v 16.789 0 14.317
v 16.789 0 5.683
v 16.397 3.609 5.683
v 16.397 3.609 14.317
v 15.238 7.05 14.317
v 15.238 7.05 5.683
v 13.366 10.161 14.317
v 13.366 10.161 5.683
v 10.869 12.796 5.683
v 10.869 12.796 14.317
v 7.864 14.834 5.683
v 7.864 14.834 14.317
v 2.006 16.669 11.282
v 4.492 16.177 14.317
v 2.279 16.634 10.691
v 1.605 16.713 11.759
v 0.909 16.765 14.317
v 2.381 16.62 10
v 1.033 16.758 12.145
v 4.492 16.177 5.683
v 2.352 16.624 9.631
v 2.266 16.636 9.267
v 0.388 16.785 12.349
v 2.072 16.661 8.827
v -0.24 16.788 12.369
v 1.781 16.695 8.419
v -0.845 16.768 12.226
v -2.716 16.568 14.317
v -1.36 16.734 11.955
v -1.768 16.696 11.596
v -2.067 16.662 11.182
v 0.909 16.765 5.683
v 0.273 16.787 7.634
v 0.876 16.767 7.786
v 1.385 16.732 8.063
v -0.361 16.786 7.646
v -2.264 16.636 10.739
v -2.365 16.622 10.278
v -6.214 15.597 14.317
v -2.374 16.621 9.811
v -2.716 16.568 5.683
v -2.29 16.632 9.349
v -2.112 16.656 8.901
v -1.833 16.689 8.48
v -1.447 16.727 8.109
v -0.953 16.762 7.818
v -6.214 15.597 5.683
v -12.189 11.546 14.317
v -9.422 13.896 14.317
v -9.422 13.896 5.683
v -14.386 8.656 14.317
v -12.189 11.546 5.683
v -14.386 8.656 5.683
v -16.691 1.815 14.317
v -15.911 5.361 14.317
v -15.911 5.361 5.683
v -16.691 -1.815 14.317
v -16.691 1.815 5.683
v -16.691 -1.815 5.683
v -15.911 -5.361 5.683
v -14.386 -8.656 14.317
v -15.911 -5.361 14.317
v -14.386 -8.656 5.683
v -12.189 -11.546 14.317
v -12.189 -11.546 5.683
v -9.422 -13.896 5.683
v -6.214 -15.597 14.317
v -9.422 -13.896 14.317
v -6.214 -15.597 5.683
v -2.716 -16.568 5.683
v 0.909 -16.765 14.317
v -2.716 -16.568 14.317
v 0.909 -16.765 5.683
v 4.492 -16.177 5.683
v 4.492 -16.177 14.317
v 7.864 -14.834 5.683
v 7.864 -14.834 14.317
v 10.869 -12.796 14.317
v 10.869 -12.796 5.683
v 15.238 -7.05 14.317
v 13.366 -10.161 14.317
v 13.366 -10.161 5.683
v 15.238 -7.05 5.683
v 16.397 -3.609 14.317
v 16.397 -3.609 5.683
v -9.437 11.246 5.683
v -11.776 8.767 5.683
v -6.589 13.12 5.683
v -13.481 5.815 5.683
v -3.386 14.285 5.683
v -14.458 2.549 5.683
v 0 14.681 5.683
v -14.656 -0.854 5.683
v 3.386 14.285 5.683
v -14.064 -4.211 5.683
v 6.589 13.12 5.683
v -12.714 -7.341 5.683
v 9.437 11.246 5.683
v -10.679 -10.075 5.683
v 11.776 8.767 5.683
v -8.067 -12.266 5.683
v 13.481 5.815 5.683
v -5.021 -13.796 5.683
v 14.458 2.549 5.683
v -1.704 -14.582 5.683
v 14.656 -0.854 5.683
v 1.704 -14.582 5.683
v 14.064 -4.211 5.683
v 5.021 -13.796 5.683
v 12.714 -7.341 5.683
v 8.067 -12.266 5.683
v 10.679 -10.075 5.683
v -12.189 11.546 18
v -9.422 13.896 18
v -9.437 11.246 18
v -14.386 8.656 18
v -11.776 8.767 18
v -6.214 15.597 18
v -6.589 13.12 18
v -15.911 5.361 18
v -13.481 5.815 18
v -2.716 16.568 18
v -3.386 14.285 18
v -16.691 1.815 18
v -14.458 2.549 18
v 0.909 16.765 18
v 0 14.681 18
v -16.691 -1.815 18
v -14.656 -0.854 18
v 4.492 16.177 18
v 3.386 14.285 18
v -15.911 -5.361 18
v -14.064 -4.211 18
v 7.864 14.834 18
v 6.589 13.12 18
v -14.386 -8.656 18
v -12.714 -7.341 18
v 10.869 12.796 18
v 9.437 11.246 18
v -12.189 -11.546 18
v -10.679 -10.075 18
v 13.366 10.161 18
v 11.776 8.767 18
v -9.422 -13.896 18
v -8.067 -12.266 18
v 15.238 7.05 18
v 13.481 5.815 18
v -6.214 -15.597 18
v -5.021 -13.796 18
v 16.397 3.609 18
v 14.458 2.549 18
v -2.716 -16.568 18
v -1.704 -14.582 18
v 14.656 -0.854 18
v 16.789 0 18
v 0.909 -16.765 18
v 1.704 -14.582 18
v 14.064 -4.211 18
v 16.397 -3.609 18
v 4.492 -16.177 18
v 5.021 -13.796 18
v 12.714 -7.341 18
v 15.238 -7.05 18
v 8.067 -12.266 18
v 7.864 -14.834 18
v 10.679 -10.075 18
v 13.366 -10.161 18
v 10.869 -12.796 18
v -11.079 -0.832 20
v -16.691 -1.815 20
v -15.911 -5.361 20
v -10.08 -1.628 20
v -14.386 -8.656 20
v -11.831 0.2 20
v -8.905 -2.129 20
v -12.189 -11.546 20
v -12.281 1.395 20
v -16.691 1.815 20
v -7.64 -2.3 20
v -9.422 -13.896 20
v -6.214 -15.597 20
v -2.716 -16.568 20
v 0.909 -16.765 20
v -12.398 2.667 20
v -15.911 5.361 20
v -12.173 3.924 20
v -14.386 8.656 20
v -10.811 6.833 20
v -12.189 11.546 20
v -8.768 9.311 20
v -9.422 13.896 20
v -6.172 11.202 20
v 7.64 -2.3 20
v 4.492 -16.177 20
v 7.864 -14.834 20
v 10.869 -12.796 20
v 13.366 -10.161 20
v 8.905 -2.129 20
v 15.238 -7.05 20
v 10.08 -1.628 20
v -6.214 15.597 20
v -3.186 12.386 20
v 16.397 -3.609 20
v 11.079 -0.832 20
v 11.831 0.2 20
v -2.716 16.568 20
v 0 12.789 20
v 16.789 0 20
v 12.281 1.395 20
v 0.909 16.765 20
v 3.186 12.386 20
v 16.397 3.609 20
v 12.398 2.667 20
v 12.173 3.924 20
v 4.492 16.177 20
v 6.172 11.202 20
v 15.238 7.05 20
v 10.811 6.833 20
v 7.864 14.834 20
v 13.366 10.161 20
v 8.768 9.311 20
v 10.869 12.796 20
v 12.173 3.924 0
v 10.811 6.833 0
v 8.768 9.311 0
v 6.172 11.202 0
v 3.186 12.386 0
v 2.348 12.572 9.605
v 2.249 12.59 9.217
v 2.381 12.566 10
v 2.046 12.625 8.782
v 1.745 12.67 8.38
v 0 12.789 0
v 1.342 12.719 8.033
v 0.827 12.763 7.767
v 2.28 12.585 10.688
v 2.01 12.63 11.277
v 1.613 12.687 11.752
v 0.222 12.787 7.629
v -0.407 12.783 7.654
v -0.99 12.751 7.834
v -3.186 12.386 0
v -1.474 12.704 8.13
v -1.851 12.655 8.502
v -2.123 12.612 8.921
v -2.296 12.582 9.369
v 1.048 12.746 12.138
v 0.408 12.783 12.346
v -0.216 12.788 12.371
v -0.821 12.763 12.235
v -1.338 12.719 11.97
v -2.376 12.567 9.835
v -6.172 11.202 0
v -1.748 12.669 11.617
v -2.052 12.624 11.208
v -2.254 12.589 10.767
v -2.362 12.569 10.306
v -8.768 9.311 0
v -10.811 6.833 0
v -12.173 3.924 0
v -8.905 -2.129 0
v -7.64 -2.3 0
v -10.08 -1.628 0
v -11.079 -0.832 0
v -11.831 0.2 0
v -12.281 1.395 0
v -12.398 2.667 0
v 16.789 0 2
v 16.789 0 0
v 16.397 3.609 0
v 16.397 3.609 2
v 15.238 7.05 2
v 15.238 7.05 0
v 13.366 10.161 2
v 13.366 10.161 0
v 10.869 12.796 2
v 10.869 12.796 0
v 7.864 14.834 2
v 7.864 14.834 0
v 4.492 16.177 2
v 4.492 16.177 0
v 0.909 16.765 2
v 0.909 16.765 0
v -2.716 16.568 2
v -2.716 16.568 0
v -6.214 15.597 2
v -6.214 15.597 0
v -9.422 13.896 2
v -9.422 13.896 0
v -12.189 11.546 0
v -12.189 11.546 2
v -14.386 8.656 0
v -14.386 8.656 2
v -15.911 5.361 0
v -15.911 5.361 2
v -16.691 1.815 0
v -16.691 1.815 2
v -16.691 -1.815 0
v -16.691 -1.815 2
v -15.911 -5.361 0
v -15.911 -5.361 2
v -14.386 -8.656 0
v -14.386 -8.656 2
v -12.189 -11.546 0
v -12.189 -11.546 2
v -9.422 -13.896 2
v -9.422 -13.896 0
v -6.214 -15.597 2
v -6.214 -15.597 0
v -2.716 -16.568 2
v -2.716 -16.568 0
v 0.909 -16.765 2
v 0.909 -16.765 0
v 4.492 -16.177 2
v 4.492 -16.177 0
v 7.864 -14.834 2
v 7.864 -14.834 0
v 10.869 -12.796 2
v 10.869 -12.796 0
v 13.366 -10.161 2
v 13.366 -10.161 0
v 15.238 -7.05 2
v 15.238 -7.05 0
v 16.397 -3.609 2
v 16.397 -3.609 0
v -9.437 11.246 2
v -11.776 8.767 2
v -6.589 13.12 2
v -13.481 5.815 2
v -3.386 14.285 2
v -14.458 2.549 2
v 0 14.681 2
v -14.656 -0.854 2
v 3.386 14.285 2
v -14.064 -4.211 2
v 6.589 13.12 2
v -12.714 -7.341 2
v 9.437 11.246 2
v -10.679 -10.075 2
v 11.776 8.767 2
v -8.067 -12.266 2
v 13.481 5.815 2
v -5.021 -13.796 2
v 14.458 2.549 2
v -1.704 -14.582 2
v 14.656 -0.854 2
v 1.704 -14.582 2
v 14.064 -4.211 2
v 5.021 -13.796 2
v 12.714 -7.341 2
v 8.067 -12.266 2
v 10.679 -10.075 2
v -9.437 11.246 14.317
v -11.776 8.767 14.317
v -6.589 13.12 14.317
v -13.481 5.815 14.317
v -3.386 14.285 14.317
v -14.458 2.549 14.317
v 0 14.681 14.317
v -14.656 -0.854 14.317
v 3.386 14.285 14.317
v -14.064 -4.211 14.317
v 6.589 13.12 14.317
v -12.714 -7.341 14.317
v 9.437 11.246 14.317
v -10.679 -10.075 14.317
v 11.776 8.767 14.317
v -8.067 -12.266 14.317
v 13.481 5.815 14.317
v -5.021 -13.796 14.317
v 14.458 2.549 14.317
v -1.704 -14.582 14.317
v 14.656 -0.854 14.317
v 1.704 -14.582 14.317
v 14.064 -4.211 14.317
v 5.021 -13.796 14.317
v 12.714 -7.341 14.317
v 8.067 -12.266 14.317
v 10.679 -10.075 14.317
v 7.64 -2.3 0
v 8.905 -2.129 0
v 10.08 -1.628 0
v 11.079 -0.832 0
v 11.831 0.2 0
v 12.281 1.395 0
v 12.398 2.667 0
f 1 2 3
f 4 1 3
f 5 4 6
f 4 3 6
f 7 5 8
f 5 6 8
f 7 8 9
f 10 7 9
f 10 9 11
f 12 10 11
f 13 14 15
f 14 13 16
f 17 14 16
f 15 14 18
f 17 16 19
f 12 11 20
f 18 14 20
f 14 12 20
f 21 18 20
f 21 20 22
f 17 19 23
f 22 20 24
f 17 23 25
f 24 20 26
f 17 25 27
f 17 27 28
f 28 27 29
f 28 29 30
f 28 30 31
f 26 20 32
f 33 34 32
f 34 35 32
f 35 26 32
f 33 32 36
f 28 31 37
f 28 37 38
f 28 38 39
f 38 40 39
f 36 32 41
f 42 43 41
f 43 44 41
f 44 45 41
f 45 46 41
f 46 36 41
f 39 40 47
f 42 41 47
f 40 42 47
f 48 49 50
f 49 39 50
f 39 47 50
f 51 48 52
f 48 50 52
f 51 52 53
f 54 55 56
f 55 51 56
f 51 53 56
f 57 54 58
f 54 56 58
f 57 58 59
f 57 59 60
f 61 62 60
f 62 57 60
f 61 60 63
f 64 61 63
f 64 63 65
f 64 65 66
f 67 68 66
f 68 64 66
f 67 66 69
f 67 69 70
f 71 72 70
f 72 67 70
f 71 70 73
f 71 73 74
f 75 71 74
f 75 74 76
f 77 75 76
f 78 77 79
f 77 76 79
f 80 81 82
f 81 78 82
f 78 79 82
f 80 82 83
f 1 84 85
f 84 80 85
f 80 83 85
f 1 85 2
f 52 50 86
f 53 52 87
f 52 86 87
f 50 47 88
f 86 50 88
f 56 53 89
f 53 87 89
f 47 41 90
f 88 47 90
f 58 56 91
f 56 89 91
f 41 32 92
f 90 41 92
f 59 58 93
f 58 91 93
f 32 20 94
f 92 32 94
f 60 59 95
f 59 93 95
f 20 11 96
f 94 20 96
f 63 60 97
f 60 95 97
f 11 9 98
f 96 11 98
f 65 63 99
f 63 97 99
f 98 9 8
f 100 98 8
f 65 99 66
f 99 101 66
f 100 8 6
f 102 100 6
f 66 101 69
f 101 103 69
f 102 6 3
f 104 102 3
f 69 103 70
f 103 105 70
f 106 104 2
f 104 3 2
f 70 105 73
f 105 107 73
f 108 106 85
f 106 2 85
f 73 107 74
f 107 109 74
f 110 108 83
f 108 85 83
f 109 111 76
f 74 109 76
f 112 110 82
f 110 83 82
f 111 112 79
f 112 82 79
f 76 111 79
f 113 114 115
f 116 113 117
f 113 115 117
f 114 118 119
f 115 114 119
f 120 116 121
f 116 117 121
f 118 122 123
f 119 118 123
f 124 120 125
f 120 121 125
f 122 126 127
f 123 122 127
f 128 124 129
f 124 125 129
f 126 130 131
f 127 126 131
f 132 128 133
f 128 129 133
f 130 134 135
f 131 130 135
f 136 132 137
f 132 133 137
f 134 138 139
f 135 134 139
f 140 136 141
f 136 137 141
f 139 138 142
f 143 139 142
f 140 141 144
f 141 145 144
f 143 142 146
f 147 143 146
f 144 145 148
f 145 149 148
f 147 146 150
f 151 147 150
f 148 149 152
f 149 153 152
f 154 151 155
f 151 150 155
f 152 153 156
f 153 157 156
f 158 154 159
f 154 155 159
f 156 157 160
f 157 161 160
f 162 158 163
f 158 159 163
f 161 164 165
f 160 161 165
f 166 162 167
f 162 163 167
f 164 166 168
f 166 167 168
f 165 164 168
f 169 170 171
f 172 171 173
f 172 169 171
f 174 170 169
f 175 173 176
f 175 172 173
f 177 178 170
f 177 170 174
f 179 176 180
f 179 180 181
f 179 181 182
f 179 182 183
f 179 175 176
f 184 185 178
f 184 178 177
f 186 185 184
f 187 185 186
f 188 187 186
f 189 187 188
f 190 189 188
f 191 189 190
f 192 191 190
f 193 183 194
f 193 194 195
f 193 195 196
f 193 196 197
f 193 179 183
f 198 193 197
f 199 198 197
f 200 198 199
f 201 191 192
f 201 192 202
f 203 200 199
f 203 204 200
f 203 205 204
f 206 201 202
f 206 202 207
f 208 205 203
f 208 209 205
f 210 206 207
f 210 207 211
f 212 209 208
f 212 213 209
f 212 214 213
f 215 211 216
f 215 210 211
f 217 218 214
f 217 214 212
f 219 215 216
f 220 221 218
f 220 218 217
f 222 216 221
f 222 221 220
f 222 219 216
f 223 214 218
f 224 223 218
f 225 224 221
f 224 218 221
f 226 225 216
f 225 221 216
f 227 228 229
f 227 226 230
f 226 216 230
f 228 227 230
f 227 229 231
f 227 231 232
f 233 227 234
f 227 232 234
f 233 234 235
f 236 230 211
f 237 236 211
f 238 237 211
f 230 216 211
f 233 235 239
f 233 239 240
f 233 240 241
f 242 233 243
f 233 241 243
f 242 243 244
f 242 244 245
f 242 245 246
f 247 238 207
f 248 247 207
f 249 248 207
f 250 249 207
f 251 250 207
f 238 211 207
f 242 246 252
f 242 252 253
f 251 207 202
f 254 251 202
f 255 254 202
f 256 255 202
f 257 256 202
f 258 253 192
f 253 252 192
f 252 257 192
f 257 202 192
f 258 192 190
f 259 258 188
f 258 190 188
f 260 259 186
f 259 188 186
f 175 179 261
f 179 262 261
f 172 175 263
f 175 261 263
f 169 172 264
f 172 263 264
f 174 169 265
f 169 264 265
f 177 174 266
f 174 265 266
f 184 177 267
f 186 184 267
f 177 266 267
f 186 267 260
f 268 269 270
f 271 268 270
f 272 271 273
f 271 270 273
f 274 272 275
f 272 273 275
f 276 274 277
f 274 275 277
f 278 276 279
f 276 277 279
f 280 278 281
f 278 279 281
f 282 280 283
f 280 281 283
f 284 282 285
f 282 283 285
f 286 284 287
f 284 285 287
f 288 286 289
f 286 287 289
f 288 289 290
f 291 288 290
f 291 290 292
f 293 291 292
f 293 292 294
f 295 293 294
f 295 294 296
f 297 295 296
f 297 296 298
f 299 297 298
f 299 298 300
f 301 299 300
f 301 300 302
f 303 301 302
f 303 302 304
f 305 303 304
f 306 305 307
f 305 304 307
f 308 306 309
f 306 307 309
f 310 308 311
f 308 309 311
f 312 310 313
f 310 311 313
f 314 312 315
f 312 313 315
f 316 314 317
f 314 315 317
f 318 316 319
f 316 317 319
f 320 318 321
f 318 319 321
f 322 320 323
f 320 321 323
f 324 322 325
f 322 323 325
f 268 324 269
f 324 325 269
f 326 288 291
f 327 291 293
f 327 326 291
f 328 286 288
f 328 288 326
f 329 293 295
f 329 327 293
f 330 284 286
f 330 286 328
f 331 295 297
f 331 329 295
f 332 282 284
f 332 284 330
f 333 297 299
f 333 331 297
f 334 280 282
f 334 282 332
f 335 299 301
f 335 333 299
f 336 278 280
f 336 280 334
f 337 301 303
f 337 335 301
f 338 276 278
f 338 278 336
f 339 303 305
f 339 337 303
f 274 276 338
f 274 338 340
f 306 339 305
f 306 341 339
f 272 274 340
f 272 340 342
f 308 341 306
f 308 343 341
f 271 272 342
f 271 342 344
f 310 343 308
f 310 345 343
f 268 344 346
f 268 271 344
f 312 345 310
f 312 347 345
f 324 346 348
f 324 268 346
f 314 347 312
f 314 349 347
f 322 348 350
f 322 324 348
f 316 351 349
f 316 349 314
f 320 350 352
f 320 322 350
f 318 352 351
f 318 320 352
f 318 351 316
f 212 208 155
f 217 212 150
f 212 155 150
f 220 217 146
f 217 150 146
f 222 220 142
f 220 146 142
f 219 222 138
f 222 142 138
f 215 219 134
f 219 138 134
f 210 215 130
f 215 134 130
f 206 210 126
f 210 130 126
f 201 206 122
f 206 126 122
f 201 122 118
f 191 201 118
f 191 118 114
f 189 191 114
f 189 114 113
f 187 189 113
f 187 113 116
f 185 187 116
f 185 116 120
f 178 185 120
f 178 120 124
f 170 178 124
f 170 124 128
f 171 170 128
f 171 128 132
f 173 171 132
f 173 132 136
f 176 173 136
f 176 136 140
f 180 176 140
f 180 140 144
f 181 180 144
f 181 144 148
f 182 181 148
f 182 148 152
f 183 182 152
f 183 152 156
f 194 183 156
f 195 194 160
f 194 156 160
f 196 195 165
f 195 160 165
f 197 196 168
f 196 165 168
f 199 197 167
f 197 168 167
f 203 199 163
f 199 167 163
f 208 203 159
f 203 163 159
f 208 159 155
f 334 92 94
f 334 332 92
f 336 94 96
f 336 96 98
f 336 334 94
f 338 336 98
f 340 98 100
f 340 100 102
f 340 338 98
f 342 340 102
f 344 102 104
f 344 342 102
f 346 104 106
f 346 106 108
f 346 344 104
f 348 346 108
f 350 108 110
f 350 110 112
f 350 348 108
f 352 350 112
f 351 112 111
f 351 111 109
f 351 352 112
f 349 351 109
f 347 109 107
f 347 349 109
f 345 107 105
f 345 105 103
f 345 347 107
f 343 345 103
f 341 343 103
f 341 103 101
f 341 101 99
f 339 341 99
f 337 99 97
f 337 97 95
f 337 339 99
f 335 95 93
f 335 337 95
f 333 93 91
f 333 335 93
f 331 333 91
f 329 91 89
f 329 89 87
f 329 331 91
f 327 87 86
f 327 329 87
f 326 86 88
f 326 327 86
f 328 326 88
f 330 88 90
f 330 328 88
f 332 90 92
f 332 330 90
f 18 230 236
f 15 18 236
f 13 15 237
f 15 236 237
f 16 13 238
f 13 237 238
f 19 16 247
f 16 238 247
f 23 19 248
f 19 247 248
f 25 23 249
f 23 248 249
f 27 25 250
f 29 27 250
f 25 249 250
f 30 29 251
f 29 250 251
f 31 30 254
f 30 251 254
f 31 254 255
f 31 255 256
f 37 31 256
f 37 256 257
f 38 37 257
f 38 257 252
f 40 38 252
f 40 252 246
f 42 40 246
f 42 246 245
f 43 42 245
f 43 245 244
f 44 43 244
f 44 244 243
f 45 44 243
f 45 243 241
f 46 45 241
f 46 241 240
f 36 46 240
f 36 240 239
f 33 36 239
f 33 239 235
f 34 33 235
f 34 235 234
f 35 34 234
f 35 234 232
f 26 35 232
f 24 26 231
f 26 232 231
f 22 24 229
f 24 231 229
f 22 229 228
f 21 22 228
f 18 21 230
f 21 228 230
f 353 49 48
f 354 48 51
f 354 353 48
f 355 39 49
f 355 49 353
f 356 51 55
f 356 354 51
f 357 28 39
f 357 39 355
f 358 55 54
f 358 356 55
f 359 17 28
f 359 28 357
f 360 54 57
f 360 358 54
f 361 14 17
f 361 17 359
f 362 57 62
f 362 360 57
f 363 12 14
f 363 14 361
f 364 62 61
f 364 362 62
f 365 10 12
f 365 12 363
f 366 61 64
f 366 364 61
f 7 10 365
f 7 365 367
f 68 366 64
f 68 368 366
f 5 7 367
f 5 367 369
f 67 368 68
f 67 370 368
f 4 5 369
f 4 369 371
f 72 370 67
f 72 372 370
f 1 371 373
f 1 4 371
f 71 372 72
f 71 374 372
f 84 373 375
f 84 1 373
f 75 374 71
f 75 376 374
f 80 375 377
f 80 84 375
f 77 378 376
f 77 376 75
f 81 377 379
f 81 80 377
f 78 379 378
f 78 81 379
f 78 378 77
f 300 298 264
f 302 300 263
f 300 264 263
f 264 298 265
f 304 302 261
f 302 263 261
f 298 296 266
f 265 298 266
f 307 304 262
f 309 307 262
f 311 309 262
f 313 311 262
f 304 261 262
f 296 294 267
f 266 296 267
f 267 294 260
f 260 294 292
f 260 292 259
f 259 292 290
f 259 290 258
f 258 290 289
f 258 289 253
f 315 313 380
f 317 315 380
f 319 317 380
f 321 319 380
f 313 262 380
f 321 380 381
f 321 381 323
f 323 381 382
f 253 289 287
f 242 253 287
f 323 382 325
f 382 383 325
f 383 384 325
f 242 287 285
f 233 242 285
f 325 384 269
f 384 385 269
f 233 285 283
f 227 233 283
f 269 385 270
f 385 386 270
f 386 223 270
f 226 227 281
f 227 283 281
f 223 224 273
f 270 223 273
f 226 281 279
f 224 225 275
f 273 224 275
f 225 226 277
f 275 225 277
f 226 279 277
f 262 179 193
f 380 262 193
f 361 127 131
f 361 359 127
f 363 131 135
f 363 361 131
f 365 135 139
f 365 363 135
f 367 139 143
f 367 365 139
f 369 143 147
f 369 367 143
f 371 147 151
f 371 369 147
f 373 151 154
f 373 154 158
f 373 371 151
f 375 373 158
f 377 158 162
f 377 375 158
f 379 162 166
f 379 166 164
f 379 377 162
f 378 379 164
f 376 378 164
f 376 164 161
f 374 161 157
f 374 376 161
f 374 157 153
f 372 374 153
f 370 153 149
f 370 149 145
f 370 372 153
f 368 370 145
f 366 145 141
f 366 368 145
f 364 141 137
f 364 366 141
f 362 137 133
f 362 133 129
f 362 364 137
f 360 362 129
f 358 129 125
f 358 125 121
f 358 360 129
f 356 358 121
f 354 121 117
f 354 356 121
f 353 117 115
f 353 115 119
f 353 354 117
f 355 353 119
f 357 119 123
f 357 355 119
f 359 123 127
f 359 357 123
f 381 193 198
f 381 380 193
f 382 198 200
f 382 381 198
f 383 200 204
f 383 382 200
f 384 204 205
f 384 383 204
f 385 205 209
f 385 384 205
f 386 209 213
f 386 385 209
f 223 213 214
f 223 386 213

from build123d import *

# Parameters (mm, degrees)
SKETCH1_R                          = 16.7894
BOSS_EXTRUDE1_DEPTH                = 20
SKETCH2_W                          = 3.683
SKETCH2_H                          = 2.1082
CUT_EXTRUDE1_DEPTH                 = 21
FILLET1_R                          = 4.7625
F_3_16_0_1875_DIAMETER_HOLE1_D     = 4.7625
F_3_16_0_1875_DIAMETER_HOLE1_DEPTH = 11.543700016
F_3_16_0_1875_DIAMETER_HOLE1_TIP   = 1.430799349


with BuildPart() as part:
    # Sketch1 → Boss-Extrude1 (new body)
    with BuildSketch(Plane.XY):
        Circle(SKETCH1_R)
    extrude(amount=BOSS_EXTRUDE1_DEPTH)

    # Sketch2 → Cut-Revolve1 (revolve, cut)
    with BuildSketch(Plane(origin=(0, 0, 0), x_dir=(0, 0, -1), z_dir=(1, 0, 0))):
        with Locations((-16.1585, 15.7353)):
            Rectangle(SKETCH2_W, SKETCH2_H)
        with Locations((-3.8415, 15.7353)):
            Rectangle(SKETCH2_W, SKETCH2_H)
    revolve(axis=Axis((0, 0, 21.240749408), (0, 0, -1)), mode=Mode.SUBTRACT)

    # Sketch3 → Cut-Extrude1 (cut, through all)
    with BuildSketch(Plane.XY.offset(20)):
        with BuildLine():
            Line((-12.580888371, -2.300000032), (12.580888371, -2.300000032))
            ThreePointArc((12.580888371, -2.300000032), (0, 12.7894), (-12.580888371, -2.300000032))
        make_face()
    extrude(amount=-CUT_EXTRUDE1_DEPTH, mode=Mode.SUBTRACT)

    # Fillet1
    fillet1_edges = [part.edges().sort_by_distance(p)[0] for p in [
        (-12.580888371, -2.300000032, 10),
        (12.580888371, -2.300000032, 10),
    ]]
    fillet(fillet1_edges, radius=FILLET1_R)

    # 3/16 (0.1875) Diameter Hole1
    with Locations(Plane(origin=(0, 16.7894, 0), x_dir=(-1, 0, 0), z_dir=(0, 1, 0))):
        with Locations((0, 10)):
            Hole(F_3_16_0_1875_DIAMETER_HOLE1_D / 2, depth=F_3_16_0_1875_DIAMETER_HOLE1_DEPTH)
            with Locations((0, 0, -(F_3_16_0_1875_DIAMETER_HOLE1_DEPTH + F_3_16_0_1875_DIAMETER_HOLE1_TIP / 2))):  # 118° drill point
                Cone(0, F_3_16_0_1875_DIAMETER_HOLE1_D / 2, F_3_16_0_1875_DIAMETER_HOLE1_TIP, mode=Mode.SUBTRACT)


solid = part.part
